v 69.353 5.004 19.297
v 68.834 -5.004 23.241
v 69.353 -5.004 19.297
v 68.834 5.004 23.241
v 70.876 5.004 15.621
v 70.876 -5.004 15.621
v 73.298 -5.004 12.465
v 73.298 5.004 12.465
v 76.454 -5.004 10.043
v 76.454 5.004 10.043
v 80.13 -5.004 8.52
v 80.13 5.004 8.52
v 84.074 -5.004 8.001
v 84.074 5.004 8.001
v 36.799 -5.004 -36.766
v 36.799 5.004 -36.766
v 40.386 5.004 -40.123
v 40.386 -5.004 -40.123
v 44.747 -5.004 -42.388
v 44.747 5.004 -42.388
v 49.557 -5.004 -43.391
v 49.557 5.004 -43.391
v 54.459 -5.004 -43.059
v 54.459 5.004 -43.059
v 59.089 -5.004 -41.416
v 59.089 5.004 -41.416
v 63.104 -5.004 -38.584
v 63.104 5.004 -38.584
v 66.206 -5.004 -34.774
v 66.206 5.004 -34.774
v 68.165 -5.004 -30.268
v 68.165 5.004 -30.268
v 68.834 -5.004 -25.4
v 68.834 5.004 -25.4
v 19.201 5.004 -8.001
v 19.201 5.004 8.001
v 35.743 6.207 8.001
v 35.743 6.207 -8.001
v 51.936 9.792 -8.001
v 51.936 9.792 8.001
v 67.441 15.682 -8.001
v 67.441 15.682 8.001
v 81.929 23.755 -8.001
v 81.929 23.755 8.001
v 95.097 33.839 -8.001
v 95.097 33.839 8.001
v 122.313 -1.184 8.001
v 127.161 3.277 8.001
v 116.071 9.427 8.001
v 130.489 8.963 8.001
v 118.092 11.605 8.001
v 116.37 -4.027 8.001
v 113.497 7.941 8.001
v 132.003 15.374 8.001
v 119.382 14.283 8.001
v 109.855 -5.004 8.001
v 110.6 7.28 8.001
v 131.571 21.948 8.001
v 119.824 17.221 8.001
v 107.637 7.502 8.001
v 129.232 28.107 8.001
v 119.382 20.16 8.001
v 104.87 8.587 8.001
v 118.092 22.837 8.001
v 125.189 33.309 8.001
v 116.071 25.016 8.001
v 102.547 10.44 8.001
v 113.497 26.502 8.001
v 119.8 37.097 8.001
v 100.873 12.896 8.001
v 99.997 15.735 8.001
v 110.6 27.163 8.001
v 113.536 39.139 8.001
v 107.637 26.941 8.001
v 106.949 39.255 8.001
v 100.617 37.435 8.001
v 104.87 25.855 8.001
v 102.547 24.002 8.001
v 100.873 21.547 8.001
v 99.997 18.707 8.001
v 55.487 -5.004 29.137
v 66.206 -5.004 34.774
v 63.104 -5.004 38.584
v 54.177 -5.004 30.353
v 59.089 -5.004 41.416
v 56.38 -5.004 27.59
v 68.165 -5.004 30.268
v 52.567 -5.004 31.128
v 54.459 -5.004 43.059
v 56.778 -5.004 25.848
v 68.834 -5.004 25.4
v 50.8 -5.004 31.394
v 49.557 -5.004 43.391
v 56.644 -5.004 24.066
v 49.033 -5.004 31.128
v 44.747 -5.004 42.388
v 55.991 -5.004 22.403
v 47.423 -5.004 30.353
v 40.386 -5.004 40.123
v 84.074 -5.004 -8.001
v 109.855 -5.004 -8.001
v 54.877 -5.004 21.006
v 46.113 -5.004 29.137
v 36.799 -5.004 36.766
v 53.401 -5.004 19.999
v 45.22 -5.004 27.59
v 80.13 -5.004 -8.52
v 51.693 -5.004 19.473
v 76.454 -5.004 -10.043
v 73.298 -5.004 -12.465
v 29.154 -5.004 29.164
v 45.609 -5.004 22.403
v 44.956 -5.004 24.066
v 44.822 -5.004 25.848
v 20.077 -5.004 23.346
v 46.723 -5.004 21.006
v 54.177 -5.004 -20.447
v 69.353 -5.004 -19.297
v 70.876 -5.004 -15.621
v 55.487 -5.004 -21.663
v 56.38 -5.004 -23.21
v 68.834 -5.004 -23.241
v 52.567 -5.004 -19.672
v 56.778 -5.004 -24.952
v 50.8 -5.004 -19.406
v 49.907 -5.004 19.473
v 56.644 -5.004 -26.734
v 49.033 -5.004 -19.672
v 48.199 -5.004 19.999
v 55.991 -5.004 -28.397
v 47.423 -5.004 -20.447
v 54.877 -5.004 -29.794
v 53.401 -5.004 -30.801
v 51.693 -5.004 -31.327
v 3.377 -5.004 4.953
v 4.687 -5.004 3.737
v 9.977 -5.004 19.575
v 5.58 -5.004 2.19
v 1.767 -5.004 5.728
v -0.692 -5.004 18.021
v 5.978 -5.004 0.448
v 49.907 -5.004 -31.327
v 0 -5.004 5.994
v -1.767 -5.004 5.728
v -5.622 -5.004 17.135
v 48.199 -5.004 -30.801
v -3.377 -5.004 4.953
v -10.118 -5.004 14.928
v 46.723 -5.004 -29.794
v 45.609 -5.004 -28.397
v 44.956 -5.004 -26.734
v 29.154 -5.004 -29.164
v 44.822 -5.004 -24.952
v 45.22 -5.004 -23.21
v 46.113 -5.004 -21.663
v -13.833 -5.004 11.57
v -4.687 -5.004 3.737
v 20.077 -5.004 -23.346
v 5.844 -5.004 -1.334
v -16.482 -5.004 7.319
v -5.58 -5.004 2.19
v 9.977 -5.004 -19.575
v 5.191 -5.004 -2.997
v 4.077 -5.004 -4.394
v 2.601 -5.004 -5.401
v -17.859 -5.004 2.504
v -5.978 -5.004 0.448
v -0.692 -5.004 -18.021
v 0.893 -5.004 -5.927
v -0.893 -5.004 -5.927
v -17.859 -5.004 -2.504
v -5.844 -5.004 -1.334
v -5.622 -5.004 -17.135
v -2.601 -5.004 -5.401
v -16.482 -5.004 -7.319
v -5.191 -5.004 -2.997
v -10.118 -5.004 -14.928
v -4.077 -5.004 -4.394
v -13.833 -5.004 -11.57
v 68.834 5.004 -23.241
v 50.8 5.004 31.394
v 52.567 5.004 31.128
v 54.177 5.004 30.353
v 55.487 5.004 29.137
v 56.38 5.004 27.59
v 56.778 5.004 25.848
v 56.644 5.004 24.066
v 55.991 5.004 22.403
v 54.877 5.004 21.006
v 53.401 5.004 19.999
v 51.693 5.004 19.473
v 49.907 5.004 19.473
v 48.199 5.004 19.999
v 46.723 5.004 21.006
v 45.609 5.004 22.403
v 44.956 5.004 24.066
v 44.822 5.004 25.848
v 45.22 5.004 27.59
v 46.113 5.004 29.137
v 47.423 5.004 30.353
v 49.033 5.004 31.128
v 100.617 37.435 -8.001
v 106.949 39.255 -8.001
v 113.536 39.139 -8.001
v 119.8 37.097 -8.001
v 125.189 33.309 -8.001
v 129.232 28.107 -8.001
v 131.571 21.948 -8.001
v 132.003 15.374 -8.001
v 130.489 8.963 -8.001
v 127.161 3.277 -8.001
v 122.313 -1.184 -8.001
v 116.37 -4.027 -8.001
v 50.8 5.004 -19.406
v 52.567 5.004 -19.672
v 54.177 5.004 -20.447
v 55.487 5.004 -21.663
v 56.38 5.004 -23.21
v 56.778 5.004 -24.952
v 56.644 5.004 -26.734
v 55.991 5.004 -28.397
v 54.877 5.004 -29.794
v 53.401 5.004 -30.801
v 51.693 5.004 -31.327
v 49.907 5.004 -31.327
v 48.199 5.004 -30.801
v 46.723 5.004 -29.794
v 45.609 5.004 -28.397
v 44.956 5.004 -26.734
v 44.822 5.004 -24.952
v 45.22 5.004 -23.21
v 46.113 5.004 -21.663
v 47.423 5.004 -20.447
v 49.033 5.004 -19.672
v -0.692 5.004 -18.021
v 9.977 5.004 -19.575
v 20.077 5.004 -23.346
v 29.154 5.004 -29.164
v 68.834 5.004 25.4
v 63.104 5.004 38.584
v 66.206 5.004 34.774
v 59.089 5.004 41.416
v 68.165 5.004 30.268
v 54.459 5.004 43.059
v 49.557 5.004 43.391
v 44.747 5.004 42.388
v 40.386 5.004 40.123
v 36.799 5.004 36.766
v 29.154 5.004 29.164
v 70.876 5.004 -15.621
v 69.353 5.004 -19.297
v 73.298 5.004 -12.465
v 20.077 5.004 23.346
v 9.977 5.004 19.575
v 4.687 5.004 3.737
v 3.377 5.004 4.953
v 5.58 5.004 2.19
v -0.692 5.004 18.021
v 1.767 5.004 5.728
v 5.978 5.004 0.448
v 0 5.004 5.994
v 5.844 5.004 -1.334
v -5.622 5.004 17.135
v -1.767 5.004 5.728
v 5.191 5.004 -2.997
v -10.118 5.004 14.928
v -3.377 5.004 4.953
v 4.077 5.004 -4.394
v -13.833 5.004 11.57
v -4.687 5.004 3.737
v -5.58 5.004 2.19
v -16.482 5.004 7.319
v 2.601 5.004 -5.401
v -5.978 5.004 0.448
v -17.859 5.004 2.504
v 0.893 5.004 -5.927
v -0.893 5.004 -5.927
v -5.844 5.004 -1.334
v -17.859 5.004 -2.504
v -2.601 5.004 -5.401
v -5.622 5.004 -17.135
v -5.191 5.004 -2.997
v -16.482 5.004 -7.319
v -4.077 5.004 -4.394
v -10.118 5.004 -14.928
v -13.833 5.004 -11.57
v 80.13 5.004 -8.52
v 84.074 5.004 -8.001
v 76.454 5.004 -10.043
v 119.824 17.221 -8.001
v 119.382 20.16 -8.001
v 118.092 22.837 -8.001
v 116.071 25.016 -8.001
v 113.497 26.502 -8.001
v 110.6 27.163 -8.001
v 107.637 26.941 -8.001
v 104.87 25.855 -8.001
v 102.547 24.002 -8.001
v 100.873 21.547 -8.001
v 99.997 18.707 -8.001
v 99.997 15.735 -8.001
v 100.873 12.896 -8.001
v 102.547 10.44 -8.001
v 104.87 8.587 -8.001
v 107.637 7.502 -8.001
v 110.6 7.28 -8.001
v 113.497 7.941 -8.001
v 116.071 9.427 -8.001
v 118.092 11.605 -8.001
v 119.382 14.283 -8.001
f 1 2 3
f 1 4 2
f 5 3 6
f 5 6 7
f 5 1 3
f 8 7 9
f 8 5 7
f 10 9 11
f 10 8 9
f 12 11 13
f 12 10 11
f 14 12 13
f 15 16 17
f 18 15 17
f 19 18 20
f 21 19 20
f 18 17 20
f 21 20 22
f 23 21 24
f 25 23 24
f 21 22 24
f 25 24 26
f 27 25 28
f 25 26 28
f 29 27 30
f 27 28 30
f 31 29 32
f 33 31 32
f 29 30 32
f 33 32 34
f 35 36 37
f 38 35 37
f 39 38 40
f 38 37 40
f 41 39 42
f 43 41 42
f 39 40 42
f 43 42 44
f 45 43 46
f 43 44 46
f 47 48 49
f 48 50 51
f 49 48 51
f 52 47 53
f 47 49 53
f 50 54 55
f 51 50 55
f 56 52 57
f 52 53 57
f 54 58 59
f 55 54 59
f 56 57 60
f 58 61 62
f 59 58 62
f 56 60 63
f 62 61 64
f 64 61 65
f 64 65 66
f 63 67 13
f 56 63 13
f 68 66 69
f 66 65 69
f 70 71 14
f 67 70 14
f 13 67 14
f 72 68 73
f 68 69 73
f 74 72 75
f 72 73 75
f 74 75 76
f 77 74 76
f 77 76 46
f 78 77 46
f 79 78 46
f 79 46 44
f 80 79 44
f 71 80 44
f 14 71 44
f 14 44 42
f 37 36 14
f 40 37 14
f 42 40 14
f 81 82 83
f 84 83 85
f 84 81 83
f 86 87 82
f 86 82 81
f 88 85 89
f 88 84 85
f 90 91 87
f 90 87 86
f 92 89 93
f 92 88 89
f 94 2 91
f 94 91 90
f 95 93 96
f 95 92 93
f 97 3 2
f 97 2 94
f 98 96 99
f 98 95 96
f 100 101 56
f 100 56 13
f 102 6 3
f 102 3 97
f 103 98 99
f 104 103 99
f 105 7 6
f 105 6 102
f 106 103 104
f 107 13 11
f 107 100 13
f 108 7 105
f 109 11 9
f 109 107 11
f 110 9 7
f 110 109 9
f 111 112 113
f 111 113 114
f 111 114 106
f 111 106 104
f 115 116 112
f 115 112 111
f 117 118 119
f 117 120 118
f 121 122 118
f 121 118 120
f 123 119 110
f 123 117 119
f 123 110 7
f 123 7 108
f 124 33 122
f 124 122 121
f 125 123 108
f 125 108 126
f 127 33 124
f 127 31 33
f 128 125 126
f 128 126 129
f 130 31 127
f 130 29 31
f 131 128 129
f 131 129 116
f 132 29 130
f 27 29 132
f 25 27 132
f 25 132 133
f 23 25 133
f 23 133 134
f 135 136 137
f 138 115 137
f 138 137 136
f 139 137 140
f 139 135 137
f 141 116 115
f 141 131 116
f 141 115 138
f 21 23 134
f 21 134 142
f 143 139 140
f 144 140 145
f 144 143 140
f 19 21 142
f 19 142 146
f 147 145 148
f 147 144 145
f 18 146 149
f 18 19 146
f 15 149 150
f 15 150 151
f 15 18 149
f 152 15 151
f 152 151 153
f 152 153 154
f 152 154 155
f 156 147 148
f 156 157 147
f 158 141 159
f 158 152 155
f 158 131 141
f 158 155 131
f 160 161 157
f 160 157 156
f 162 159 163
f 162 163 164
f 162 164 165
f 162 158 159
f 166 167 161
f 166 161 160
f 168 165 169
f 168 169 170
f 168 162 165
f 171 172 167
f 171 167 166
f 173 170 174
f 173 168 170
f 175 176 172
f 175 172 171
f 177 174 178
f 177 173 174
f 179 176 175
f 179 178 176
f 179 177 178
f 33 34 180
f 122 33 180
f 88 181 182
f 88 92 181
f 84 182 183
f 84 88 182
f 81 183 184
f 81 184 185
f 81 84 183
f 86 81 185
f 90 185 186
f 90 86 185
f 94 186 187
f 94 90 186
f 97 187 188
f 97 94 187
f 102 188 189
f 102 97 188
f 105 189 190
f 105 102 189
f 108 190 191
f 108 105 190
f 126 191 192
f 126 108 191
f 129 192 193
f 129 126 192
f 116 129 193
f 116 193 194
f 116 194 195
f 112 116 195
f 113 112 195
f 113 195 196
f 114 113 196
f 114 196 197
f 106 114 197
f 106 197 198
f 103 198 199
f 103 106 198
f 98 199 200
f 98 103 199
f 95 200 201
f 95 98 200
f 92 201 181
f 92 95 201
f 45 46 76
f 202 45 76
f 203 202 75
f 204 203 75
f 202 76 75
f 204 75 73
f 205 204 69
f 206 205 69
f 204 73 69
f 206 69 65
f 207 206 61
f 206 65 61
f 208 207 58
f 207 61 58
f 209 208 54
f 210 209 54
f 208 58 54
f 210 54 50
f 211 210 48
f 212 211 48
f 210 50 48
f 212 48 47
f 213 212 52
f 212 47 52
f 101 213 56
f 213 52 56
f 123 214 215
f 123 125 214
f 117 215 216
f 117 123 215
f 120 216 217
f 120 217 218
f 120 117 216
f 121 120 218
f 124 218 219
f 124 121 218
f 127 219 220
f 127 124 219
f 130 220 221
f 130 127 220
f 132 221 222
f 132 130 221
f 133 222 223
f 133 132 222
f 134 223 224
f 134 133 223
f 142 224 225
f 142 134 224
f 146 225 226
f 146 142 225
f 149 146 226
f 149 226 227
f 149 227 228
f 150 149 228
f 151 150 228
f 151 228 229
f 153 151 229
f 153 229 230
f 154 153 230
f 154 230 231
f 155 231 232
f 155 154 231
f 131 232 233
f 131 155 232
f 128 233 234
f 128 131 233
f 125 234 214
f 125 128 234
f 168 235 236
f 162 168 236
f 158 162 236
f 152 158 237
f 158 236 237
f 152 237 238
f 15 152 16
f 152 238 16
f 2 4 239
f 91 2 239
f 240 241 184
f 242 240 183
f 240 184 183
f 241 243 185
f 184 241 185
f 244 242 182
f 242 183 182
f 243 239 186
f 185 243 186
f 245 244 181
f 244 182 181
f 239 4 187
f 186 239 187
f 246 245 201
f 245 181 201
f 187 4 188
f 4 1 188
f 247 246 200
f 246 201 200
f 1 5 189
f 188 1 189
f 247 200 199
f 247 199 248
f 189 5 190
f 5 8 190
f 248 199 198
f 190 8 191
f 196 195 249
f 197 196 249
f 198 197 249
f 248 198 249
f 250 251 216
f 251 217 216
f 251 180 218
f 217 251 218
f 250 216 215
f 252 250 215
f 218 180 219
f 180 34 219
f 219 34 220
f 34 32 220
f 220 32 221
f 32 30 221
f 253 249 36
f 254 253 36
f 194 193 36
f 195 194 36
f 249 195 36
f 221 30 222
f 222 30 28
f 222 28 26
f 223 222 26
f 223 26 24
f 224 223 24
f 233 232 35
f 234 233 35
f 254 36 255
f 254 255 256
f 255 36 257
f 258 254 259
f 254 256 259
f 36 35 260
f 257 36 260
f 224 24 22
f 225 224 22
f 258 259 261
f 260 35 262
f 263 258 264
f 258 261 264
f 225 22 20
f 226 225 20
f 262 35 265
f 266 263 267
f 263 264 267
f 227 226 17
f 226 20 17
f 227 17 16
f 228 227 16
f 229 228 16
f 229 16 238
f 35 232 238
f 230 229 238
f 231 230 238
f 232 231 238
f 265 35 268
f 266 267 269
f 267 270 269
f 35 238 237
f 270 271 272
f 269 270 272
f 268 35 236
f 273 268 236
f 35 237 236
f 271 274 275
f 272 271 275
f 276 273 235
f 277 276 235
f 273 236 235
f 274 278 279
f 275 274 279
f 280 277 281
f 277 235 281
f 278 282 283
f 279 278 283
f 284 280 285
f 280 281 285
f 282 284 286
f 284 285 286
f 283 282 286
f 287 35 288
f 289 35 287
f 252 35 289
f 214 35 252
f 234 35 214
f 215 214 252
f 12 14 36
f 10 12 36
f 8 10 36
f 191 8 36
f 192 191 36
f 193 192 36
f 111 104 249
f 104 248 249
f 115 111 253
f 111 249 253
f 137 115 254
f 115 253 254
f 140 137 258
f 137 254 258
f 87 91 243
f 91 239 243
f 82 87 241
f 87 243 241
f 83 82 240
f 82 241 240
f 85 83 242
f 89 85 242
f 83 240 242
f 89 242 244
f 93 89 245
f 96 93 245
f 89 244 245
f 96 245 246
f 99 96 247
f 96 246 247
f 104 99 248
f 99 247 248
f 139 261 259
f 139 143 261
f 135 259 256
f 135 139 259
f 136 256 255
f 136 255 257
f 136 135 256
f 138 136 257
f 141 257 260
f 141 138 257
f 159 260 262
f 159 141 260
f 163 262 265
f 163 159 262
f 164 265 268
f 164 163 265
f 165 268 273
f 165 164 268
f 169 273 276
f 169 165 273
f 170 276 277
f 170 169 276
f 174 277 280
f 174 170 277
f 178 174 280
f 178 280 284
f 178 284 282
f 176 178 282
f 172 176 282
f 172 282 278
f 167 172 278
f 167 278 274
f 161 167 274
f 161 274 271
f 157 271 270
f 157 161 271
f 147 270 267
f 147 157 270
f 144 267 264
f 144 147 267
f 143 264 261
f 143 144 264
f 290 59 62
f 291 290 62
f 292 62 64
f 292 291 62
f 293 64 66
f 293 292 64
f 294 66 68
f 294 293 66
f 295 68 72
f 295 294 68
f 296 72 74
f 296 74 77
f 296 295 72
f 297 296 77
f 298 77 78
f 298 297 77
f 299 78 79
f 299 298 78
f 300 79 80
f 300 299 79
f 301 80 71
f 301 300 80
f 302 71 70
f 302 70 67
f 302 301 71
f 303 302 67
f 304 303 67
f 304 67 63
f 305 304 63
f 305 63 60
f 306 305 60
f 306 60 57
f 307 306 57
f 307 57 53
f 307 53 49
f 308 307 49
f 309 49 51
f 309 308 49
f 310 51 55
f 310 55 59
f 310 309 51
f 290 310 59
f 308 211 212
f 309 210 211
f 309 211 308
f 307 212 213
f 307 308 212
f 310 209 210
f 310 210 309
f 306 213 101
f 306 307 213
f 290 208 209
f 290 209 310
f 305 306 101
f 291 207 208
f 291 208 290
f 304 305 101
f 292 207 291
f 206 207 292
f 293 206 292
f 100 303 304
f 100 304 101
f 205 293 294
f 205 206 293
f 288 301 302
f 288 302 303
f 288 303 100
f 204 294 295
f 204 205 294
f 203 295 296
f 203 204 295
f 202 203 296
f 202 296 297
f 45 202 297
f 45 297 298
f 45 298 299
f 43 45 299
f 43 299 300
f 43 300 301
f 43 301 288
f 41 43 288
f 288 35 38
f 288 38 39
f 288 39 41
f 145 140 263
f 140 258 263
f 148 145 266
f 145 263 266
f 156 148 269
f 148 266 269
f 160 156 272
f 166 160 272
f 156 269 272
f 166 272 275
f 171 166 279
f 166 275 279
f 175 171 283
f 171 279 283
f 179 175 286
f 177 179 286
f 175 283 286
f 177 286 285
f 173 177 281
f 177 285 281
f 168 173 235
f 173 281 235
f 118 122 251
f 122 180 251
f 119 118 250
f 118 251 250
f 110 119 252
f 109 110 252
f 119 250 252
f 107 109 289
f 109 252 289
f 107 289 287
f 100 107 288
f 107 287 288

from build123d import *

# Parameters (mm, degrees)
SKETCH2_R           = 5.9944
BOSS_EXTRUDE1_DEPTH = 5.0038
SKETCH3_R           = 9.9695
BOSS_EXTRUDE2_DEPTH = 8.001
FILLET1_R           = 15.24


with BuildPart() as part:
    # Sketch2 → Boss-Extrude1 (new, symmetric)
    with BuildSketch(Plane(origin=(0, 0, 0), x_dir=(1, 0, 0), z_dir=(0, 1, 0))):
        with BuildLine():
            Line((68.834, 25.4), (68.834, -25.4))
            ThreePointArc((68.834, -25.4), (56.830149579, -42.395953991), (36.798683148, -36.76610234))
            ThreePointArc((36.798683148, -36.76610234), (20.076804637, -23.346390726), (-0.69209176, -18.020714886))
            ThreePointArc((-0.69209176, -18.020714886), (-18.034, 0), (-0.69209176, 18.020714886))
            ThreePointArc((-0.69209176, 18.020714886), (20.076804637, 23.346390726), (36.798683148, 36.76610234))
            ThreePointArc((36.798683148, 36.76610234), (56.830149579, 42.395953991), (68.834, 25.4))
        make_face()
        with Locations(Location((0, 0, 0), (0, 0, 270))):
            Circle(SKETCH2_R, mode=Mode.SUBTRACT)
        with Locations(Location((50.8, 25.4, 0), (0, 0, 270))):
            Circle(SKETCH2_R, mode=Mode.SUBTRACT)
        with Locations(Location((50.8, -25.4, 0), (0, 0, 270))):
            Circle(SKETCH2_R, mode=Mode.SUBTRACT)
    extrude(amount=BOSS_EXTRUDE1_DEPTH, both=True)

    # Sketch3 → Boss-Extrude2 (add, symmetric)
    with BuildSketch(Plane.XY):
        with BuildLine():
            Line((109.855, -5.0038), (68.834, -5.0038))
            Line((68.834, -5.0038), (68.834, 5.0038))
            Line((68.834, 5.0038), (36.798683148, 5.0038))
            Line((36.798683148, 5.0038), (19.200610133, 5.0038))
            ThreePointArc((19.200610133, 5.0038), (59.795544448, 12.455583787), (95.097308626, 33.839297674))
            ThreePointArc((95.097308626, 33.839297674), (130.631042041, 25.11465945), (109.855, -5.0038))
        make_face()
        with Locations((109.855, 17.2212)):
            Circle(SKETCH3_R, mode=Mode.SUBTRACT)
    extrude(amount=BOSS_EXTRUDE2_DEPTH, both=True)

    # Fillet1
    fillet1_edges = [part.edges().sort_by_distance(p)[0] for p in [
        (68.834, 0, 8.001),
        (68.834, 0, -8.001),
    ]]
    fillet(fillet1_edges, radius=FILLET1_R)


solid = part.part
